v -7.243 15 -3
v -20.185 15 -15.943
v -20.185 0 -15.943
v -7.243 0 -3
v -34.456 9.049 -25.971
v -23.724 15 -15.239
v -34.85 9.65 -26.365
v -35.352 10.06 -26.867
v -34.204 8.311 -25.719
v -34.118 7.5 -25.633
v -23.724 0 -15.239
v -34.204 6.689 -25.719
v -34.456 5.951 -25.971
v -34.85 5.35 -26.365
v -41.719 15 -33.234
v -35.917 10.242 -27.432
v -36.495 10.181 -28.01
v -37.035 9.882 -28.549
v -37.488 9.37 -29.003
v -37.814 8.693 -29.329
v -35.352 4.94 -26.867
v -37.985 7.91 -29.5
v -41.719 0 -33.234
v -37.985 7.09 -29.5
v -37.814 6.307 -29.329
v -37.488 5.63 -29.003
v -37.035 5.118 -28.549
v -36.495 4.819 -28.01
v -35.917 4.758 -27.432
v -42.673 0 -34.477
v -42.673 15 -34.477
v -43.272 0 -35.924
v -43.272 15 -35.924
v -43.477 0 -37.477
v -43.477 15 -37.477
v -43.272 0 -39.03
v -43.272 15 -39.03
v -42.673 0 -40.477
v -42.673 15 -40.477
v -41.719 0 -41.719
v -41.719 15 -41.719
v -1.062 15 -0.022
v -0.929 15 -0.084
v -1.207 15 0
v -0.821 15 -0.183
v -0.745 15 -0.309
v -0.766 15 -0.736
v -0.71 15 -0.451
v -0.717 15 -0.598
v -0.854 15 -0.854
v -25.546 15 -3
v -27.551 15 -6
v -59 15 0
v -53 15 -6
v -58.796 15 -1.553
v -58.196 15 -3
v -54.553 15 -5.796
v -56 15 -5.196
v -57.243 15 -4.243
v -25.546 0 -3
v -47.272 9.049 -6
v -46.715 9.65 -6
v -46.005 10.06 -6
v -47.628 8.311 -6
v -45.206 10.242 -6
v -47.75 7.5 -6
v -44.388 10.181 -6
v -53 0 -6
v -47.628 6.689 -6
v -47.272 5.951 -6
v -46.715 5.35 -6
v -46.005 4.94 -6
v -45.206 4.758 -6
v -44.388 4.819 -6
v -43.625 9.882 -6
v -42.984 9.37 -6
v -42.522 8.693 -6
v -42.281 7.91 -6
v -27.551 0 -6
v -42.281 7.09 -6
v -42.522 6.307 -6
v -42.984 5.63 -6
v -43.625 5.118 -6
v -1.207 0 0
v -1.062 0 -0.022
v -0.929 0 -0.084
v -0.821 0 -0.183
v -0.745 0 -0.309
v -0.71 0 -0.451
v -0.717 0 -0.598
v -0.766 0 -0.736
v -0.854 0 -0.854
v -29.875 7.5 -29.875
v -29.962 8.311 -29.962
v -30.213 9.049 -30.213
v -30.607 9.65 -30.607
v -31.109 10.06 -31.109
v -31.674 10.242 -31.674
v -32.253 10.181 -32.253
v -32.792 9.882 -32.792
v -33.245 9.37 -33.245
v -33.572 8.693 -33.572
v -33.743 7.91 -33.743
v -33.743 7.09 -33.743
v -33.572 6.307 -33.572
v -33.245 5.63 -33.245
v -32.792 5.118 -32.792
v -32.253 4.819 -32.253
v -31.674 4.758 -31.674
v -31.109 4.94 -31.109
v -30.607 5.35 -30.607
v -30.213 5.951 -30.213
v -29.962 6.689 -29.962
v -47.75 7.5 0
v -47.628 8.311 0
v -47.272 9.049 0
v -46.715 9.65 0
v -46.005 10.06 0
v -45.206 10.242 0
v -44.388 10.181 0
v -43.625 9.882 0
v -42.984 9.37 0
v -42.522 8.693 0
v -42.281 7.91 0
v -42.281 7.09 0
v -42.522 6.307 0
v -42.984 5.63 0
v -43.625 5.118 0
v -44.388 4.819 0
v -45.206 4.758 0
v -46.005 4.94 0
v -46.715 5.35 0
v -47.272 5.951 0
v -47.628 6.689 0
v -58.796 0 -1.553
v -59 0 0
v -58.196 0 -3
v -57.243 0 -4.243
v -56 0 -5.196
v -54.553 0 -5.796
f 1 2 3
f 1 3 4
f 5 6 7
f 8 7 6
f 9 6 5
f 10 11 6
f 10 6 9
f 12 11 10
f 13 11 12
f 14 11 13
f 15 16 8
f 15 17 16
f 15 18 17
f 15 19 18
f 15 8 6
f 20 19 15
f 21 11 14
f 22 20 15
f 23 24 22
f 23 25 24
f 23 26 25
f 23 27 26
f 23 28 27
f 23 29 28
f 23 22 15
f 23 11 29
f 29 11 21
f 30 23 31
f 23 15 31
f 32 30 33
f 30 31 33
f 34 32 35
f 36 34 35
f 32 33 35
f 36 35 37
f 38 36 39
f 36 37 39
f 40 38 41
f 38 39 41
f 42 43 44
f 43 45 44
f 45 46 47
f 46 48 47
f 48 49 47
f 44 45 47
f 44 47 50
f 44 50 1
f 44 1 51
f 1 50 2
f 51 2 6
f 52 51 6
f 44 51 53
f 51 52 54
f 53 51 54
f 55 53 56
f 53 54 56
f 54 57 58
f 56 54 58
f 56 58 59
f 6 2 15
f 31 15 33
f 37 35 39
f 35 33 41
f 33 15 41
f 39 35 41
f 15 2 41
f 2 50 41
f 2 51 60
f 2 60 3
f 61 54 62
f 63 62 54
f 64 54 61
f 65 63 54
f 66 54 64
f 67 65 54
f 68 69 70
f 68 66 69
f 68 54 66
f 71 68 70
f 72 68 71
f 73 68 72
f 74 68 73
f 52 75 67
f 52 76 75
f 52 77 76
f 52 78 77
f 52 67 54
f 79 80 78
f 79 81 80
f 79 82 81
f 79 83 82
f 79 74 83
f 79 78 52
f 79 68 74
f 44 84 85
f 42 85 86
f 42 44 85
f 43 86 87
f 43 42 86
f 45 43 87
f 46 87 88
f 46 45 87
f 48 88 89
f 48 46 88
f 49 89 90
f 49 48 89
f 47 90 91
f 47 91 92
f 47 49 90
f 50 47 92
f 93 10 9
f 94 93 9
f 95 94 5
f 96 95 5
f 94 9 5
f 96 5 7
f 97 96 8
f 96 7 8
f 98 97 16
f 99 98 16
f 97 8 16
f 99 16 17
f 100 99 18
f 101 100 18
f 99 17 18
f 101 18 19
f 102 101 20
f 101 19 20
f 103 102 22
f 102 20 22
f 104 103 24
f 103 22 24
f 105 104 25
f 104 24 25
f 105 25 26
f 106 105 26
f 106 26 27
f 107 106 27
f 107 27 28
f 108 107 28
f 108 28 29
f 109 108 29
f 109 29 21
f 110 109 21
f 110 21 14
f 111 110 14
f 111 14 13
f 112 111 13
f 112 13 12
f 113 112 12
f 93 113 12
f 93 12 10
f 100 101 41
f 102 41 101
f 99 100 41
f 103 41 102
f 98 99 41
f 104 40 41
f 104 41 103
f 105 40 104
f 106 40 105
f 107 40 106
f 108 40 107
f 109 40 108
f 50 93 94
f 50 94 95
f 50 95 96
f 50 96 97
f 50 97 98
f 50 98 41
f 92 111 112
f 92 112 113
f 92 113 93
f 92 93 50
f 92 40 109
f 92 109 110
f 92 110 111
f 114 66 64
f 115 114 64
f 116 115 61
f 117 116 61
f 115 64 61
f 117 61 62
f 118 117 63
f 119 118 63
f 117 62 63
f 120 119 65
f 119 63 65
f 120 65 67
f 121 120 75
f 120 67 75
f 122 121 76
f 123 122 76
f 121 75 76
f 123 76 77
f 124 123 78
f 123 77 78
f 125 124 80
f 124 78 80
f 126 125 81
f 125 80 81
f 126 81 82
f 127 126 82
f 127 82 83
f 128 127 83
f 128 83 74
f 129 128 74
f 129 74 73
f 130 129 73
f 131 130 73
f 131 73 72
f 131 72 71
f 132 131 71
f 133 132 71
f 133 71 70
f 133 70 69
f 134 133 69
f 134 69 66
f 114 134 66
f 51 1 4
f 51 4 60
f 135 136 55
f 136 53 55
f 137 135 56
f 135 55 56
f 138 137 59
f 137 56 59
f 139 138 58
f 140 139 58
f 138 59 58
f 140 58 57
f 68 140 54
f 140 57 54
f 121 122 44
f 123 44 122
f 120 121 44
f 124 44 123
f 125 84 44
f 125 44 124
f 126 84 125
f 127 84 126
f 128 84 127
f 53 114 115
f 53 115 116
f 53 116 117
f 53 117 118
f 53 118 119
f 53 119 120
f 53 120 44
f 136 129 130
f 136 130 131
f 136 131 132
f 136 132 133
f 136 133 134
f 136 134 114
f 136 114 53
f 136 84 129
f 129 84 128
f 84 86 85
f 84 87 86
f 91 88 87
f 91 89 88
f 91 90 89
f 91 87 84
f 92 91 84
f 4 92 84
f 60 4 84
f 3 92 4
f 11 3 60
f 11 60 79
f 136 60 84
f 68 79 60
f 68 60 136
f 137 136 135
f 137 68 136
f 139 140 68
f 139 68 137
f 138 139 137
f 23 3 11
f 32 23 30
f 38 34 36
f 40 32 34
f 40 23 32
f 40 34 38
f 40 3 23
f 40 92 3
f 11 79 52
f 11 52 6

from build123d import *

# Parameters (mm, degrees)
BOSS_EXTRUDE1_DEPTH = 15
FILLET1_R           = 6
FILLET2_R           = 0.5
CUT_EXTRUDE1_DEPTH  = 74.800406503
SKETCH3_R           = 2.75
CUT_EXTRUDE2_DEPTH  = 71.582351894
SKETCH4_R           = 2.75
CUT_EXTRUDE3_DEPTH  = 74.04702868


with BuildPart() as part:
    # Sketch1 → Boss-Extrude1 (new body)
    with BuildSketch(Plane(origin=(0, 0, 0), x_dir=(1, 0, 0), z_dir=(0, 1, 0))):
        Polygon((0, 0), (-59, 0), (-59, 6), (-27.550911023, 6), (-23.724076699, 15.238795325), (-45.961940777, 37.476659403), (-41.71930009, 41.71930009), align=None)
    extrude(amount=BOSS_EXTRUDE1_DEPTH)

    # Fillet1
    fillet1_edges = [part.edges().sort_by_distance(p)[0] for p in [
        (-45.961940777, 7.5, -37.476659403),
        (-59, 7.5, -6),
    ]]
    fillet(fillet1_edges, radius=FILLET1_R - 0.0001)  # a hair under: the kernel refuses the full size

    # Fillet2
    fillet2_edges = [part.edges().sort_by_distance(p)[0] for p in [
        (0, 7.5, 0),
    ]]
    fillet(fillet2_edges, radius=FILLET2_R)

    # Sketch2 → Cut-Extrude1 (cut, through all)
    with BuildSketch(Plane(origin=(0, 15, 0), x_dir=(1, 0, 0), z_dir=(0, 1, 0))):
        Polygon((-20.185335418, 15.942694731), (-7.242640687, 3), (-25.546375109, 3), align=None)
    extrude(amount=-CUT_EXTRUDE1_DEPTH, mode=Mode.SUBTRACT)

    # Sketch3 → Cut-Extrude2 (cut, through all)
    with BuildSketch(Plane(origin=(0, 0, -6), x_dir=(-1, 0, 0), z_dir=(0, 0, -1))):
        with Locations((45, 7.5)):
            Circle(SKETCH3_R)
    extrude(amount=-CUT_EXTRUDE2_DEPTH, mode=Mode.SUBTRACT)

    # Sketch4 → Cut-Extrude3 (cut, through all)
    with BuildSketch(Plane(origin=(-4.242640687, 0, 4.242640687), x_dir=(0.7071067811865465, 0, 0.7071067811865486), z_dir=(-0.7071067811865486, 0, 0.7071067811865465))):
        with Locations((-45, 7.5)):
            Circle(SKETCH4_R)
    extrude(amount=-CUT_EXTRUDE3_DEPTH, mode=Mode.SUBTRACT)


solid = part.part
